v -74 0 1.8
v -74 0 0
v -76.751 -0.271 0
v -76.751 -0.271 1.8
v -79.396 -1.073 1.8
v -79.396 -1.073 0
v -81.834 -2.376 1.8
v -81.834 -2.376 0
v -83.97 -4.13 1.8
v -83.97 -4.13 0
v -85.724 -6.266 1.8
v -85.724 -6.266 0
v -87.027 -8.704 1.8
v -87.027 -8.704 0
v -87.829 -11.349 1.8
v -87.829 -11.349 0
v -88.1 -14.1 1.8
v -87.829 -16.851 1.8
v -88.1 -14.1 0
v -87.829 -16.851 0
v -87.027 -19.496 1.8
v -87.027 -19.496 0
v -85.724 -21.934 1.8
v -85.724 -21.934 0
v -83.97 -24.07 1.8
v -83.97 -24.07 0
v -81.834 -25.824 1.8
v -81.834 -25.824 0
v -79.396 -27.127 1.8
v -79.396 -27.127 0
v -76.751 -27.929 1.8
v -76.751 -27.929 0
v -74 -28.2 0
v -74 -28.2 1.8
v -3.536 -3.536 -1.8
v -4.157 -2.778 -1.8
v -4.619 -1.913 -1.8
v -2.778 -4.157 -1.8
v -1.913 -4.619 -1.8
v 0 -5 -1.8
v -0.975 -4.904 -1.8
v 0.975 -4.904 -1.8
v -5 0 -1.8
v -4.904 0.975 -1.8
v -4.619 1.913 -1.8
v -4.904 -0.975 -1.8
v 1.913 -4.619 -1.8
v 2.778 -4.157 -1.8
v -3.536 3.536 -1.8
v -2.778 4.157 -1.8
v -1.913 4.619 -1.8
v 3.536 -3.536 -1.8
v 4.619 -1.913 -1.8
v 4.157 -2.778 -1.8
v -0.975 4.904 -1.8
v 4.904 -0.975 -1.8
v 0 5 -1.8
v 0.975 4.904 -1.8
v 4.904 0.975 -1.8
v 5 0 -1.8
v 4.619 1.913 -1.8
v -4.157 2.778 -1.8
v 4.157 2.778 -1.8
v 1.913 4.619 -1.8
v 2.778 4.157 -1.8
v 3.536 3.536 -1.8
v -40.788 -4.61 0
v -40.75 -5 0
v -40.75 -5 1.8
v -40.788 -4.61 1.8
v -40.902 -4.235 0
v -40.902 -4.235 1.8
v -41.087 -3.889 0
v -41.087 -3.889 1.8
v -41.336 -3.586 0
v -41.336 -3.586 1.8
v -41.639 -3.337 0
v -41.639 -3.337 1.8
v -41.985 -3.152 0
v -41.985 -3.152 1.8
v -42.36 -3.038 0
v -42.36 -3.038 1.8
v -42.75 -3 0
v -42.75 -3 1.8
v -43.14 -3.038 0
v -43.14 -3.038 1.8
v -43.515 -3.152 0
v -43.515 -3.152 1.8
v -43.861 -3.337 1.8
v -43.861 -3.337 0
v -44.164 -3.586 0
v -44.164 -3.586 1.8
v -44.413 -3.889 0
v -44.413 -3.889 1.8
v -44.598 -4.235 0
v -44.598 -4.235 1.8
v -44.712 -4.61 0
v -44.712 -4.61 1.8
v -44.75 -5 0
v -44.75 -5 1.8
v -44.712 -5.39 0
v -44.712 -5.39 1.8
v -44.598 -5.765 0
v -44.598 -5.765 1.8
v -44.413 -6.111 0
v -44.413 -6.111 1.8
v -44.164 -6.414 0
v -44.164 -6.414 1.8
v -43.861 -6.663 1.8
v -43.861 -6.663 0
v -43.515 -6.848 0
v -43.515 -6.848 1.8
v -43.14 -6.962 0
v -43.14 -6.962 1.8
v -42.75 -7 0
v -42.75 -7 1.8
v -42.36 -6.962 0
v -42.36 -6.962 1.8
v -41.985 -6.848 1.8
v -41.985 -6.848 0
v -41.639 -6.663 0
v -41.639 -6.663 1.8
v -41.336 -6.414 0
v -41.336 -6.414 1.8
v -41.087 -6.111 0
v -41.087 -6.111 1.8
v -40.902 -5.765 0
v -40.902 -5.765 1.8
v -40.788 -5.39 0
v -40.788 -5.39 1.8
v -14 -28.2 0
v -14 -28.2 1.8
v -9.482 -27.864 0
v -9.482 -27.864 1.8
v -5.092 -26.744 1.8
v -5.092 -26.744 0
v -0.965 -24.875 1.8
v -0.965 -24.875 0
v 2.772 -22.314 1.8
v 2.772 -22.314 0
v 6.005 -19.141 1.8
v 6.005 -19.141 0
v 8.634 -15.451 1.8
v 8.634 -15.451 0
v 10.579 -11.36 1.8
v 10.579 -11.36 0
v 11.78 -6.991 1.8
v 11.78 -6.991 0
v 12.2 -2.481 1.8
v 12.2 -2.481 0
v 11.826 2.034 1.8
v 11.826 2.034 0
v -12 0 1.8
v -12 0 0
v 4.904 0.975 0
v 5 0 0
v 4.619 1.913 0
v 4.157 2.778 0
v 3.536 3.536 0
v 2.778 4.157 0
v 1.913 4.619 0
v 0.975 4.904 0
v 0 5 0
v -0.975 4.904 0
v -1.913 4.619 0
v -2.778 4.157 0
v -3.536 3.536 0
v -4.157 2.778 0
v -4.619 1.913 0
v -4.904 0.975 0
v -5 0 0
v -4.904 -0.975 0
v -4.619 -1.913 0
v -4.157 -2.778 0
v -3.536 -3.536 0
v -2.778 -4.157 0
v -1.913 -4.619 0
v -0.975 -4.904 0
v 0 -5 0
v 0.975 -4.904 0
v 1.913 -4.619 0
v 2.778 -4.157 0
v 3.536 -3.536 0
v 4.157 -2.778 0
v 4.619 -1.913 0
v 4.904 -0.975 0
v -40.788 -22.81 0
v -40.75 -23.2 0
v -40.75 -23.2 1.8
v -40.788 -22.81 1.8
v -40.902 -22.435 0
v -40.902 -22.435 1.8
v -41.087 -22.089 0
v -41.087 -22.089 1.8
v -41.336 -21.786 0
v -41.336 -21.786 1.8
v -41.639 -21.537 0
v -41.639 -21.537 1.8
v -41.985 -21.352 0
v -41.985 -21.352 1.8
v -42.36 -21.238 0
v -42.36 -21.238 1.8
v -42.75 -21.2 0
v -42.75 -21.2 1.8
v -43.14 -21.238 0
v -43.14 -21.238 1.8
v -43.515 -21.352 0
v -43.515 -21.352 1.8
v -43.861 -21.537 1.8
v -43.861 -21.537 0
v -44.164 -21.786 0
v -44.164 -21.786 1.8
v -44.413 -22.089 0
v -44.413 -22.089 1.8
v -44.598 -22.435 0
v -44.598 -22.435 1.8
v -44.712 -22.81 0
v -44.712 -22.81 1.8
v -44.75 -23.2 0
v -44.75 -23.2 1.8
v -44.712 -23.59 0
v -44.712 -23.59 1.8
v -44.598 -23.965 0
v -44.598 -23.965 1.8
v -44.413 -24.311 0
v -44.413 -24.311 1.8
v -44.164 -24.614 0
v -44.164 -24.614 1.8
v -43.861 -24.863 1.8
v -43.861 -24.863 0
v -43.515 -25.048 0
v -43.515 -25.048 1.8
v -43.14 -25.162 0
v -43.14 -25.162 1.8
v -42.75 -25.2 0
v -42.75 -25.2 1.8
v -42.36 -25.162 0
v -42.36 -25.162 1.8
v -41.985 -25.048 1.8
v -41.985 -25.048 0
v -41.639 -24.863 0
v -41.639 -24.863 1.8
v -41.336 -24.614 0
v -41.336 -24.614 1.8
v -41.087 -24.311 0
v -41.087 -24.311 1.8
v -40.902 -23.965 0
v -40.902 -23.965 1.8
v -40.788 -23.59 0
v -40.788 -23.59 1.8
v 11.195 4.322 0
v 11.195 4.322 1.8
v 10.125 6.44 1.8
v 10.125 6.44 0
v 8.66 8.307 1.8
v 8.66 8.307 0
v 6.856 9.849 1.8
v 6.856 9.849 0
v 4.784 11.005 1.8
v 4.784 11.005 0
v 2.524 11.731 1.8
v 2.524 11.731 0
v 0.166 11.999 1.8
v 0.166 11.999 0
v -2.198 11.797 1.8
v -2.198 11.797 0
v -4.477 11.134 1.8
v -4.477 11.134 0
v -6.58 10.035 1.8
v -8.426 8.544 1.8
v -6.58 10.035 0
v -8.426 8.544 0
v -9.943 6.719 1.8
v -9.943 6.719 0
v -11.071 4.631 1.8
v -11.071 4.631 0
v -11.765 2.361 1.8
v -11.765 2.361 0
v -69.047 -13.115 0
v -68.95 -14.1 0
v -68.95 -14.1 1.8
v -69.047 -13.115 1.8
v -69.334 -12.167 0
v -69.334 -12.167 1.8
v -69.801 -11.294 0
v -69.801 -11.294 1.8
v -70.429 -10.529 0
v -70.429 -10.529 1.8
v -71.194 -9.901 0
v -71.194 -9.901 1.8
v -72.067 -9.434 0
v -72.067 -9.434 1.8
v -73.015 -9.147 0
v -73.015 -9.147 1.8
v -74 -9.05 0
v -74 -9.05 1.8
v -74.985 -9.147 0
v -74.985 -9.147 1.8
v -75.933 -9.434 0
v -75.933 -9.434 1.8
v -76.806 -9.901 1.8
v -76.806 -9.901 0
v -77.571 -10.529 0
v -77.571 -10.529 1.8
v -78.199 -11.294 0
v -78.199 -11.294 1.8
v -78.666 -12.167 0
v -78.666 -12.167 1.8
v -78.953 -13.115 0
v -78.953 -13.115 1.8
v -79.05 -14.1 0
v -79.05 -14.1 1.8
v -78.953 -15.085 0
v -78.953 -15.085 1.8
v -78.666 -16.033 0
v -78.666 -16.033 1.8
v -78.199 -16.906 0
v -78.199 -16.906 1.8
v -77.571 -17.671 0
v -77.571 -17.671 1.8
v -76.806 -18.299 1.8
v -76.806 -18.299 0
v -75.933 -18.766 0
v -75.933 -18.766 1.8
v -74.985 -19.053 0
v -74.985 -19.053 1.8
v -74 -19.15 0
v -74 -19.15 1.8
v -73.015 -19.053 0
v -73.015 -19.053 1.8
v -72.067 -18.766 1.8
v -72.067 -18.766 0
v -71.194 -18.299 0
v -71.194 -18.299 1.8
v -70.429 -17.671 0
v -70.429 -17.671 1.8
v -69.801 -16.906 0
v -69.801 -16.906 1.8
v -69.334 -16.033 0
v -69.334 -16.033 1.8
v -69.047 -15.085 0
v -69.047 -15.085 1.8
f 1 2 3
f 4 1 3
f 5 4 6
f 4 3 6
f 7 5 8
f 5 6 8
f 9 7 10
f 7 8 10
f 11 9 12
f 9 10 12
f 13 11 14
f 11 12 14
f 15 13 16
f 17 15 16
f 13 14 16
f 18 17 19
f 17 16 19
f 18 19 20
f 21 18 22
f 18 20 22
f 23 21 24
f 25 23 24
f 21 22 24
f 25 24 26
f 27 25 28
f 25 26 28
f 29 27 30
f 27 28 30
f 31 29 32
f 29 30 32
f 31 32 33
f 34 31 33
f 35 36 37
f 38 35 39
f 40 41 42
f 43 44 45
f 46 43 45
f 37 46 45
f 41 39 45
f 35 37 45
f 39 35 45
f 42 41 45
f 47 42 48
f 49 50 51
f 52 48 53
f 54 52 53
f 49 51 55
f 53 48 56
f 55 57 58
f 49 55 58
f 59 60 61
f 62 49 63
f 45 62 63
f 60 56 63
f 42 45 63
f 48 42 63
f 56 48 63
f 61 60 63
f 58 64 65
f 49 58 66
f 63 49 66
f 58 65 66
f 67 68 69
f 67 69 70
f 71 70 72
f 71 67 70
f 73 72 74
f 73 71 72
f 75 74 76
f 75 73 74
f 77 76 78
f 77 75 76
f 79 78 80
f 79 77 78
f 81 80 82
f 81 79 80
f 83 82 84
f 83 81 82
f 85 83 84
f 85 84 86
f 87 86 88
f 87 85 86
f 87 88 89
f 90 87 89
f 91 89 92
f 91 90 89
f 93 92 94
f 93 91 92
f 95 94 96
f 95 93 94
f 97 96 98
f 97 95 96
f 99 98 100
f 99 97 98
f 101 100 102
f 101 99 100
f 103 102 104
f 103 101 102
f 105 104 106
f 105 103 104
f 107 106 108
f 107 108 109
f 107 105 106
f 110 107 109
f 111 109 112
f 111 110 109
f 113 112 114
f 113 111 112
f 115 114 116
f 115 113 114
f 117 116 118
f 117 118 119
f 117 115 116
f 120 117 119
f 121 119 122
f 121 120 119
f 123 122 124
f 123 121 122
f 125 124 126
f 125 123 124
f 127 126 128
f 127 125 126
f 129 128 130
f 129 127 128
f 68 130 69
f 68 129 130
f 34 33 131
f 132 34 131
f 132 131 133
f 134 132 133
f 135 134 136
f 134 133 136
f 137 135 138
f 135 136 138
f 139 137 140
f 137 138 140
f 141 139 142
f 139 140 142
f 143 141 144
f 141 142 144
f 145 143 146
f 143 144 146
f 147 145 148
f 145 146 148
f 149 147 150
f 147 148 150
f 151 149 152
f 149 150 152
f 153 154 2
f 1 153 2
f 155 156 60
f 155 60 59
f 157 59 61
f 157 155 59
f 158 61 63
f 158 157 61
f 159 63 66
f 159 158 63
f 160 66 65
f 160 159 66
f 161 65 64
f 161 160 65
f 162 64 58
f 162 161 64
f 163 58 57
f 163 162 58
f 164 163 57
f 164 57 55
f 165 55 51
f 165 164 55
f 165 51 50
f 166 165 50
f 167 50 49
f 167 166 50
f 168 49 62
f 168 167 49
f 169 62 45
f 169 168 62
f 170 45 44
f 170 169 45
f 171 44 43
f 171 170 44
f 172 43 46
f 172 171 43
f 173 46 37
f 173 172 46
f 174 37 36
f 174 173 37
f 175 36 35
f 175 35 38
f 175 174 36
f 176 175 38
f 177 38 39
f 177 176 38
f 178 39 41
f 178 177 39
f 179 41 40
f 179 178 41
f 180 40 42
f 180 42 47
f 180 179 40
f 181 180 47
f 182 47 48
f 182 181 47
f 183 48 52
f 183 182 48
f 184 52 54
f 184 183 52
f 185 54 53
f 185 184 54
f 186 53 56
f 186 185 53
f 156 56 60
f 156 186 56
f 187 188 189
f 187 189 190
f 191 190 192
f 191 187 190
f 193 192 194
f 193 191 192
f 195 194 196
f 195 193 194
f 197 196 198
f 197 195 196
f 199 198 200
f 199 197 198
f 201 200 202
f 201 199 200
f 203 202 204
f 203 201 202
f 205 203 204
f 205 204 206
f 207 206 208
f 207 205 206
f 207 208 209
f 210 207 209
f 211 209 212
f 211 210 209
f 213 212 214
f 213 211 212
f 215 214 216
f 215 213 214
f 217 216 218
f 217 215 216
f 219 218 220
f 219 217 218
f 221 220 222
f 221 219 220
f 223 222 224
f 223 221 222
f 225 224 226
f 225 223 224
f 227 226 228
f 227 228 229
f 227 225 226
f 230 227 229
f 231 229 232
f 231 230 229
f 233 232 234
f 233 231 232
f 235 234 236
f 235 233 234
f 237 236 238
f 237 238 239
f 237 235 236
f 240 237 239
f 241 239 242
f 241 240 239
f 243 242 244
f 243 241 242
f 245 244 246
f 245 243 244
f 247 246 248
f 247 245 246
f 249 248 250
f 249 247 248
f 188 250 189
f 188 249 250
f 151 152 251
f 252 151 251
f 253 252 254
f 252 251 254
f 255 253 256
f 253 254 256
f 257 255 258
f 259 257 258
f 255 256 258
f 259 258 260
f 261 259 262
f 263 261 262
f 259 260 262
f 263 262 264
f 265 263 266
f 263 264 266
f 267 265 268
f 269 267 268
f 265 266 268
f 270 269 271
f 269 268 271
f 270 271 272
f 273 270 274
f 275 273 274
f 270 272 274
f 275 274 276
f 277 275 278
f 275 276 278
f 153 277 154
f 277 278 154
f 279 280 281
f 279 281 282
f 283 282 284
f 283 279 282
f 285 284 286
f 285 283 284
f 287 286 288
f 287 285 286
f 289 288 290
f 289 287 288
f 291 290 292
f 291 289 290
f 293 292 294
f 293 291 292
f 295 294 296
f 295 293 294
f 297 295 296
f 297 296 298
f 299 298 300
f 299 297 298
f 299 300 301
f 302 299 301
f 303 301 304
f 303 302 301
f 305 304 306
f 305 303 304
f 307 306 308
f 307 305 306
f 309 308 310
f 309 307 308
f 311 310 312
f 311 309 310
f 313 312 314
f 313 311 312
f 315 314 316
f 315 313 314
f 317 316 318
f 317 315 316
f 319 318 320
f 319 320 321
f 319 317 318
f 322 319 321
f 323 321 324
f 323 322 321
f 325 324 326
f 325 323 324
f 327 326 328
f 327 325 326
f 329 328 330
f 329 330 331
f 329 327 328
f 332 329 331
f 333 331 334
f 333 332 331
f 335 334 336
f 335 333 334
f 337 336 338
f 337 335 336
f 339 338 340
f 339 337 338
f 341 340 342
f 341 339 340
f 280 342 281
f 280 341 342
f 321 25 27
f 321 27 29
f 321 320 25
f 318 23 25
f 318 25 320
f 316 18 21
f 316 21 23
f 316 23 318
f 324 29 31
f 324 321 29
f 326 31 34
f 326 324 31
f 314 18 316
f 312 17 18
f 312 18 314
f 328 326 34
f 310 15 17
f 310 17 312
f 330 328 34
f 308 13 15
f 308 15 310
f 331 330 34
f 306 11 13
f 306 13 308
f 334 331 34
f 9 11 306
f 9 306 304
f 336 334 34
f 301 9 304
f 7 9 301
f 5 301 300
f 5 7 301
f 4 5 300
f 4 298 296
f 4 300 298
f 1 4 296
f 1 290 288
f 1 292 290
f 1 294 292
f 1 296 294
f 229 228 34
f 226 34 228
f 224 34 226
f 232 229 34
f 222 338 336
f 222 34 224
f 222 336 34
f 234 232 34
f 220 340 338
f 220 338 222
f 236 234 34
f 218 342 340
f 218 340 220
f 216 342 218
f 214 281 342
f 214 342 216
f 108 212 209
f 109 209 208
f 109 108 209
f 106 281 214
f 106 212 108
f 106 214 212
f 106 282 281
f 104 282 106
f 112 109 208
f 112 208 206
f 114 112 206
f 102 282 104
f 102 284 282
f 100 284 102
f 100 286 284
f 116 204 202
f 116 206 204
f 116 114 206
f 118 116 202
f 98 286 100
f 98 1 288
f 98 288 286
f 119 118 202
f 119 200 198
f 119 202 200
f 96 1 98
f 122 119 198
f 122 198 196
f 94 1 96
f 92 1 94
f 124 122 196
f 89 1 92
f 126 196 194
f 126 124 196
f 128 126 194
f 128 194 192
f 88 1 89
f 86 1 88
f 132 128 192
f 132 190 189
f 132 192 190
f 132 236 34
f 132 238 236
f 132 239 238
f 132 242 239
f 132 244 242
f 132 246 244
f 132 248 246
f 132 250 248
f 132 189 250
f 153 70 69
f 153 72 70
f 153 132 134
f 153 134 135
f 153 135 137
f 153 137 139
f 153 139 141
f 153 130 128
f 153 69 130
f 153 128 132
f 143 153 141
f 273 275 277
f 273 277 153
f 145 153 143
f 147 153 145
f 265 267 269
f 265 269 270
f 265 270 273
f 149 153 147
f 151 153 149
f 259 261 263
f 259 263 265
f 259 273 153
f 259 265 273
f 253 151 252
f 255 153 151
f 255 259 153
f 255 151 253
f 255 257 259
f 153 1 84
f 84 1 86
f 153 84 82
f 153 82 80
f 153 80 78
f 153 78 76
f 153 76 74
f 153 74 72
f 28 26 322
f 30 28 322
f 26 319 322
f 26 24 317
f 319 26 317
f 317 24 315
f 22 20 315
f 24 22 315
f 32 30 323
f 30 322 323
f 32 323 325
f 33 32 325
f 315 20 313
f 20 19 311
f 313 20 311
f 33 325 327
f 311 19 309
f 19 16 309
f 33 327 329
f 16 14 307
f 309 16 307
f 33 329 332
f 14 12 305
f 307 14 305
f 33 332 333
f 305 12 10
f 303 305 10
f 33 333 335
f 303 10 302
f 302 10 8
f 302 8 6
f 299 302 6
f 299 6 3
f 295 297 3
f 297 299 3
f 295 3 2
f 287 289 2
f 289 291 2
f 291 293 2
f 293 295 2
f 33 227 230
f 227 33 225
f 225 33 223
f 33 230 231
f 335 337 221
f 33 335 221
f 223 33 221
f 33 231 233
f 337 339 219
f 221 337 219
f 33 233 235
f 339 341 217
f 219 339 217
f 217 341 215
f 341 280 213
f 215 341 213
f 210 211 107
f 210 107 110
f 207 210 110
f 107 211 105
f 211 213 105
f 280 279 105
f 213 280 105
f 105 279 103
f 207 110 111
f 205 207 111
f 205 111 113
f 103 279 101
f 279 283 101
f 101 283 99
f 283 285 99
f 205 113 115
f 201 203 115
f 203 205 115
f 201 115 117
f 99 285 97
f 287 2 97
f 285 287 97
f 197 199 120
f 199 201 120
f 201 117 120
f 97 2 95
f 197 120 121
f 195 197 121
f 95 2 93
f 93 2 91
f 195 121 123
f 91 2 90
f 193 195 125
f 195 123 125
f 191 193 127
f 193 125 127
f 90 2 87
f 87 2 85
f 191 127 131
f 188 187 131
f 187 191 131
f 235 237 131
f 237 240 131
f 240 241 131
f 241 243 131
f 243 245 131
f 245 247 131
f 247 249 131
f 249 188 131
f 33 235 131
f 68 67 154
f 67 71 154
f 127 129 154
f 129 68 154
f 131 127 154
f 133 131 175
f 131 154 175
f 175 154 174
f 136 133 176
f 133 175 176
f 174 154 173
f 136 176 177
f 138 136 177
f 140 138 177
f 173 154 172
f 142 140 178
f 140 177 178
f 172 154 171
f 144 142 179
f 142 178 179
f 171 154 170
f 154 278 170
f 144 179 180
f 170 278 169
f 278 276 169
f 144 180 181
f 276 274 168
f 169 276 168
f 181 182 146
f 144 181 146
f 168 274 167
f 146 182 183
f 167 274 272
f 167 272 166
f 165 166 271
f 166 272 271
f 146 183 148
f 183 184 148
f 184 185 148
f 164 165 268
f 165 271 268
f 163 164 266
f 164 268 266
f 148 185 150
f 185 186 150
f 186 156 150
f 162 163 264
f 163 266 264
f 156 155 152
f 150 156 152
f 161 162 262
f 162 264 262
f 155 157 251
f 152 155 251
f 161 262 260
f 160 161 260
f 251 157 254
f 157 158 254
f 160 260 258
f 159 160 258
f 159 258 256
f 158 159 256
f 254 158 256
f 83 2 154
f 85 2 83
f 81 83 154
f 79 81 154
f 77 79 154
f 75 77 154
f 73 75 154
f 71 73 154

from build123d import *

# Parameters (mm, degrees)
ESBO_O1_R                = 5.05
ESBO_O1_R_2              = 2
RESSALTO_EXTRUS_O1_DEPTH = 1.8
ESBO_O2_R                = 5
RESSALTO_EXTRUS_O2_DEPTH = 1.8


with BuildPart() as part:
    # Esboço1 → Ressalto-extrusão1 (new body)
    with BuildSketch(Plane.XY):
        with BuildLine():
            Line((-12, 0), (-74, 0))
            ThreePointArc((-74, 0), (-88.1, -14.1), (-74, -28.2))
            Line((-74, -28.2), (-14, -28.2))
            ThreePointArc((-14, -28.2), (6.004940765, -19.140656488), (11.826301138, 2.034355278))
            ThreePointArc((11.826301138, 2.034355278), (-1.020878628, 11.956496428), (-12, 0))
        make_face()
        with Locations((-74, -14.1)):
            Circle(ESBO_O1_R, mode=Mode.SUBTRACT)
        with Locations((-42.75, -5)):
            Circle(ESBO_O1_R_2, mode=Mode.SUBTRACT)
        with Locations((-42.75, -23.2)):
            Circle(ESBO_O1_R_2, mode=Mode.SUBTRACT)
    extrude(amount=RESSALTO_EXTRUS_O1_DEPTH)

    # Esboço2 → Ressalto-extrusão2 (add)
    with BuildSketch(Plane.XY):
        Circle(ESBO_O2_R)
    extrude(amount=-RESSALTO_EXTRUS_O2_DEPTH)


solid = part.part
